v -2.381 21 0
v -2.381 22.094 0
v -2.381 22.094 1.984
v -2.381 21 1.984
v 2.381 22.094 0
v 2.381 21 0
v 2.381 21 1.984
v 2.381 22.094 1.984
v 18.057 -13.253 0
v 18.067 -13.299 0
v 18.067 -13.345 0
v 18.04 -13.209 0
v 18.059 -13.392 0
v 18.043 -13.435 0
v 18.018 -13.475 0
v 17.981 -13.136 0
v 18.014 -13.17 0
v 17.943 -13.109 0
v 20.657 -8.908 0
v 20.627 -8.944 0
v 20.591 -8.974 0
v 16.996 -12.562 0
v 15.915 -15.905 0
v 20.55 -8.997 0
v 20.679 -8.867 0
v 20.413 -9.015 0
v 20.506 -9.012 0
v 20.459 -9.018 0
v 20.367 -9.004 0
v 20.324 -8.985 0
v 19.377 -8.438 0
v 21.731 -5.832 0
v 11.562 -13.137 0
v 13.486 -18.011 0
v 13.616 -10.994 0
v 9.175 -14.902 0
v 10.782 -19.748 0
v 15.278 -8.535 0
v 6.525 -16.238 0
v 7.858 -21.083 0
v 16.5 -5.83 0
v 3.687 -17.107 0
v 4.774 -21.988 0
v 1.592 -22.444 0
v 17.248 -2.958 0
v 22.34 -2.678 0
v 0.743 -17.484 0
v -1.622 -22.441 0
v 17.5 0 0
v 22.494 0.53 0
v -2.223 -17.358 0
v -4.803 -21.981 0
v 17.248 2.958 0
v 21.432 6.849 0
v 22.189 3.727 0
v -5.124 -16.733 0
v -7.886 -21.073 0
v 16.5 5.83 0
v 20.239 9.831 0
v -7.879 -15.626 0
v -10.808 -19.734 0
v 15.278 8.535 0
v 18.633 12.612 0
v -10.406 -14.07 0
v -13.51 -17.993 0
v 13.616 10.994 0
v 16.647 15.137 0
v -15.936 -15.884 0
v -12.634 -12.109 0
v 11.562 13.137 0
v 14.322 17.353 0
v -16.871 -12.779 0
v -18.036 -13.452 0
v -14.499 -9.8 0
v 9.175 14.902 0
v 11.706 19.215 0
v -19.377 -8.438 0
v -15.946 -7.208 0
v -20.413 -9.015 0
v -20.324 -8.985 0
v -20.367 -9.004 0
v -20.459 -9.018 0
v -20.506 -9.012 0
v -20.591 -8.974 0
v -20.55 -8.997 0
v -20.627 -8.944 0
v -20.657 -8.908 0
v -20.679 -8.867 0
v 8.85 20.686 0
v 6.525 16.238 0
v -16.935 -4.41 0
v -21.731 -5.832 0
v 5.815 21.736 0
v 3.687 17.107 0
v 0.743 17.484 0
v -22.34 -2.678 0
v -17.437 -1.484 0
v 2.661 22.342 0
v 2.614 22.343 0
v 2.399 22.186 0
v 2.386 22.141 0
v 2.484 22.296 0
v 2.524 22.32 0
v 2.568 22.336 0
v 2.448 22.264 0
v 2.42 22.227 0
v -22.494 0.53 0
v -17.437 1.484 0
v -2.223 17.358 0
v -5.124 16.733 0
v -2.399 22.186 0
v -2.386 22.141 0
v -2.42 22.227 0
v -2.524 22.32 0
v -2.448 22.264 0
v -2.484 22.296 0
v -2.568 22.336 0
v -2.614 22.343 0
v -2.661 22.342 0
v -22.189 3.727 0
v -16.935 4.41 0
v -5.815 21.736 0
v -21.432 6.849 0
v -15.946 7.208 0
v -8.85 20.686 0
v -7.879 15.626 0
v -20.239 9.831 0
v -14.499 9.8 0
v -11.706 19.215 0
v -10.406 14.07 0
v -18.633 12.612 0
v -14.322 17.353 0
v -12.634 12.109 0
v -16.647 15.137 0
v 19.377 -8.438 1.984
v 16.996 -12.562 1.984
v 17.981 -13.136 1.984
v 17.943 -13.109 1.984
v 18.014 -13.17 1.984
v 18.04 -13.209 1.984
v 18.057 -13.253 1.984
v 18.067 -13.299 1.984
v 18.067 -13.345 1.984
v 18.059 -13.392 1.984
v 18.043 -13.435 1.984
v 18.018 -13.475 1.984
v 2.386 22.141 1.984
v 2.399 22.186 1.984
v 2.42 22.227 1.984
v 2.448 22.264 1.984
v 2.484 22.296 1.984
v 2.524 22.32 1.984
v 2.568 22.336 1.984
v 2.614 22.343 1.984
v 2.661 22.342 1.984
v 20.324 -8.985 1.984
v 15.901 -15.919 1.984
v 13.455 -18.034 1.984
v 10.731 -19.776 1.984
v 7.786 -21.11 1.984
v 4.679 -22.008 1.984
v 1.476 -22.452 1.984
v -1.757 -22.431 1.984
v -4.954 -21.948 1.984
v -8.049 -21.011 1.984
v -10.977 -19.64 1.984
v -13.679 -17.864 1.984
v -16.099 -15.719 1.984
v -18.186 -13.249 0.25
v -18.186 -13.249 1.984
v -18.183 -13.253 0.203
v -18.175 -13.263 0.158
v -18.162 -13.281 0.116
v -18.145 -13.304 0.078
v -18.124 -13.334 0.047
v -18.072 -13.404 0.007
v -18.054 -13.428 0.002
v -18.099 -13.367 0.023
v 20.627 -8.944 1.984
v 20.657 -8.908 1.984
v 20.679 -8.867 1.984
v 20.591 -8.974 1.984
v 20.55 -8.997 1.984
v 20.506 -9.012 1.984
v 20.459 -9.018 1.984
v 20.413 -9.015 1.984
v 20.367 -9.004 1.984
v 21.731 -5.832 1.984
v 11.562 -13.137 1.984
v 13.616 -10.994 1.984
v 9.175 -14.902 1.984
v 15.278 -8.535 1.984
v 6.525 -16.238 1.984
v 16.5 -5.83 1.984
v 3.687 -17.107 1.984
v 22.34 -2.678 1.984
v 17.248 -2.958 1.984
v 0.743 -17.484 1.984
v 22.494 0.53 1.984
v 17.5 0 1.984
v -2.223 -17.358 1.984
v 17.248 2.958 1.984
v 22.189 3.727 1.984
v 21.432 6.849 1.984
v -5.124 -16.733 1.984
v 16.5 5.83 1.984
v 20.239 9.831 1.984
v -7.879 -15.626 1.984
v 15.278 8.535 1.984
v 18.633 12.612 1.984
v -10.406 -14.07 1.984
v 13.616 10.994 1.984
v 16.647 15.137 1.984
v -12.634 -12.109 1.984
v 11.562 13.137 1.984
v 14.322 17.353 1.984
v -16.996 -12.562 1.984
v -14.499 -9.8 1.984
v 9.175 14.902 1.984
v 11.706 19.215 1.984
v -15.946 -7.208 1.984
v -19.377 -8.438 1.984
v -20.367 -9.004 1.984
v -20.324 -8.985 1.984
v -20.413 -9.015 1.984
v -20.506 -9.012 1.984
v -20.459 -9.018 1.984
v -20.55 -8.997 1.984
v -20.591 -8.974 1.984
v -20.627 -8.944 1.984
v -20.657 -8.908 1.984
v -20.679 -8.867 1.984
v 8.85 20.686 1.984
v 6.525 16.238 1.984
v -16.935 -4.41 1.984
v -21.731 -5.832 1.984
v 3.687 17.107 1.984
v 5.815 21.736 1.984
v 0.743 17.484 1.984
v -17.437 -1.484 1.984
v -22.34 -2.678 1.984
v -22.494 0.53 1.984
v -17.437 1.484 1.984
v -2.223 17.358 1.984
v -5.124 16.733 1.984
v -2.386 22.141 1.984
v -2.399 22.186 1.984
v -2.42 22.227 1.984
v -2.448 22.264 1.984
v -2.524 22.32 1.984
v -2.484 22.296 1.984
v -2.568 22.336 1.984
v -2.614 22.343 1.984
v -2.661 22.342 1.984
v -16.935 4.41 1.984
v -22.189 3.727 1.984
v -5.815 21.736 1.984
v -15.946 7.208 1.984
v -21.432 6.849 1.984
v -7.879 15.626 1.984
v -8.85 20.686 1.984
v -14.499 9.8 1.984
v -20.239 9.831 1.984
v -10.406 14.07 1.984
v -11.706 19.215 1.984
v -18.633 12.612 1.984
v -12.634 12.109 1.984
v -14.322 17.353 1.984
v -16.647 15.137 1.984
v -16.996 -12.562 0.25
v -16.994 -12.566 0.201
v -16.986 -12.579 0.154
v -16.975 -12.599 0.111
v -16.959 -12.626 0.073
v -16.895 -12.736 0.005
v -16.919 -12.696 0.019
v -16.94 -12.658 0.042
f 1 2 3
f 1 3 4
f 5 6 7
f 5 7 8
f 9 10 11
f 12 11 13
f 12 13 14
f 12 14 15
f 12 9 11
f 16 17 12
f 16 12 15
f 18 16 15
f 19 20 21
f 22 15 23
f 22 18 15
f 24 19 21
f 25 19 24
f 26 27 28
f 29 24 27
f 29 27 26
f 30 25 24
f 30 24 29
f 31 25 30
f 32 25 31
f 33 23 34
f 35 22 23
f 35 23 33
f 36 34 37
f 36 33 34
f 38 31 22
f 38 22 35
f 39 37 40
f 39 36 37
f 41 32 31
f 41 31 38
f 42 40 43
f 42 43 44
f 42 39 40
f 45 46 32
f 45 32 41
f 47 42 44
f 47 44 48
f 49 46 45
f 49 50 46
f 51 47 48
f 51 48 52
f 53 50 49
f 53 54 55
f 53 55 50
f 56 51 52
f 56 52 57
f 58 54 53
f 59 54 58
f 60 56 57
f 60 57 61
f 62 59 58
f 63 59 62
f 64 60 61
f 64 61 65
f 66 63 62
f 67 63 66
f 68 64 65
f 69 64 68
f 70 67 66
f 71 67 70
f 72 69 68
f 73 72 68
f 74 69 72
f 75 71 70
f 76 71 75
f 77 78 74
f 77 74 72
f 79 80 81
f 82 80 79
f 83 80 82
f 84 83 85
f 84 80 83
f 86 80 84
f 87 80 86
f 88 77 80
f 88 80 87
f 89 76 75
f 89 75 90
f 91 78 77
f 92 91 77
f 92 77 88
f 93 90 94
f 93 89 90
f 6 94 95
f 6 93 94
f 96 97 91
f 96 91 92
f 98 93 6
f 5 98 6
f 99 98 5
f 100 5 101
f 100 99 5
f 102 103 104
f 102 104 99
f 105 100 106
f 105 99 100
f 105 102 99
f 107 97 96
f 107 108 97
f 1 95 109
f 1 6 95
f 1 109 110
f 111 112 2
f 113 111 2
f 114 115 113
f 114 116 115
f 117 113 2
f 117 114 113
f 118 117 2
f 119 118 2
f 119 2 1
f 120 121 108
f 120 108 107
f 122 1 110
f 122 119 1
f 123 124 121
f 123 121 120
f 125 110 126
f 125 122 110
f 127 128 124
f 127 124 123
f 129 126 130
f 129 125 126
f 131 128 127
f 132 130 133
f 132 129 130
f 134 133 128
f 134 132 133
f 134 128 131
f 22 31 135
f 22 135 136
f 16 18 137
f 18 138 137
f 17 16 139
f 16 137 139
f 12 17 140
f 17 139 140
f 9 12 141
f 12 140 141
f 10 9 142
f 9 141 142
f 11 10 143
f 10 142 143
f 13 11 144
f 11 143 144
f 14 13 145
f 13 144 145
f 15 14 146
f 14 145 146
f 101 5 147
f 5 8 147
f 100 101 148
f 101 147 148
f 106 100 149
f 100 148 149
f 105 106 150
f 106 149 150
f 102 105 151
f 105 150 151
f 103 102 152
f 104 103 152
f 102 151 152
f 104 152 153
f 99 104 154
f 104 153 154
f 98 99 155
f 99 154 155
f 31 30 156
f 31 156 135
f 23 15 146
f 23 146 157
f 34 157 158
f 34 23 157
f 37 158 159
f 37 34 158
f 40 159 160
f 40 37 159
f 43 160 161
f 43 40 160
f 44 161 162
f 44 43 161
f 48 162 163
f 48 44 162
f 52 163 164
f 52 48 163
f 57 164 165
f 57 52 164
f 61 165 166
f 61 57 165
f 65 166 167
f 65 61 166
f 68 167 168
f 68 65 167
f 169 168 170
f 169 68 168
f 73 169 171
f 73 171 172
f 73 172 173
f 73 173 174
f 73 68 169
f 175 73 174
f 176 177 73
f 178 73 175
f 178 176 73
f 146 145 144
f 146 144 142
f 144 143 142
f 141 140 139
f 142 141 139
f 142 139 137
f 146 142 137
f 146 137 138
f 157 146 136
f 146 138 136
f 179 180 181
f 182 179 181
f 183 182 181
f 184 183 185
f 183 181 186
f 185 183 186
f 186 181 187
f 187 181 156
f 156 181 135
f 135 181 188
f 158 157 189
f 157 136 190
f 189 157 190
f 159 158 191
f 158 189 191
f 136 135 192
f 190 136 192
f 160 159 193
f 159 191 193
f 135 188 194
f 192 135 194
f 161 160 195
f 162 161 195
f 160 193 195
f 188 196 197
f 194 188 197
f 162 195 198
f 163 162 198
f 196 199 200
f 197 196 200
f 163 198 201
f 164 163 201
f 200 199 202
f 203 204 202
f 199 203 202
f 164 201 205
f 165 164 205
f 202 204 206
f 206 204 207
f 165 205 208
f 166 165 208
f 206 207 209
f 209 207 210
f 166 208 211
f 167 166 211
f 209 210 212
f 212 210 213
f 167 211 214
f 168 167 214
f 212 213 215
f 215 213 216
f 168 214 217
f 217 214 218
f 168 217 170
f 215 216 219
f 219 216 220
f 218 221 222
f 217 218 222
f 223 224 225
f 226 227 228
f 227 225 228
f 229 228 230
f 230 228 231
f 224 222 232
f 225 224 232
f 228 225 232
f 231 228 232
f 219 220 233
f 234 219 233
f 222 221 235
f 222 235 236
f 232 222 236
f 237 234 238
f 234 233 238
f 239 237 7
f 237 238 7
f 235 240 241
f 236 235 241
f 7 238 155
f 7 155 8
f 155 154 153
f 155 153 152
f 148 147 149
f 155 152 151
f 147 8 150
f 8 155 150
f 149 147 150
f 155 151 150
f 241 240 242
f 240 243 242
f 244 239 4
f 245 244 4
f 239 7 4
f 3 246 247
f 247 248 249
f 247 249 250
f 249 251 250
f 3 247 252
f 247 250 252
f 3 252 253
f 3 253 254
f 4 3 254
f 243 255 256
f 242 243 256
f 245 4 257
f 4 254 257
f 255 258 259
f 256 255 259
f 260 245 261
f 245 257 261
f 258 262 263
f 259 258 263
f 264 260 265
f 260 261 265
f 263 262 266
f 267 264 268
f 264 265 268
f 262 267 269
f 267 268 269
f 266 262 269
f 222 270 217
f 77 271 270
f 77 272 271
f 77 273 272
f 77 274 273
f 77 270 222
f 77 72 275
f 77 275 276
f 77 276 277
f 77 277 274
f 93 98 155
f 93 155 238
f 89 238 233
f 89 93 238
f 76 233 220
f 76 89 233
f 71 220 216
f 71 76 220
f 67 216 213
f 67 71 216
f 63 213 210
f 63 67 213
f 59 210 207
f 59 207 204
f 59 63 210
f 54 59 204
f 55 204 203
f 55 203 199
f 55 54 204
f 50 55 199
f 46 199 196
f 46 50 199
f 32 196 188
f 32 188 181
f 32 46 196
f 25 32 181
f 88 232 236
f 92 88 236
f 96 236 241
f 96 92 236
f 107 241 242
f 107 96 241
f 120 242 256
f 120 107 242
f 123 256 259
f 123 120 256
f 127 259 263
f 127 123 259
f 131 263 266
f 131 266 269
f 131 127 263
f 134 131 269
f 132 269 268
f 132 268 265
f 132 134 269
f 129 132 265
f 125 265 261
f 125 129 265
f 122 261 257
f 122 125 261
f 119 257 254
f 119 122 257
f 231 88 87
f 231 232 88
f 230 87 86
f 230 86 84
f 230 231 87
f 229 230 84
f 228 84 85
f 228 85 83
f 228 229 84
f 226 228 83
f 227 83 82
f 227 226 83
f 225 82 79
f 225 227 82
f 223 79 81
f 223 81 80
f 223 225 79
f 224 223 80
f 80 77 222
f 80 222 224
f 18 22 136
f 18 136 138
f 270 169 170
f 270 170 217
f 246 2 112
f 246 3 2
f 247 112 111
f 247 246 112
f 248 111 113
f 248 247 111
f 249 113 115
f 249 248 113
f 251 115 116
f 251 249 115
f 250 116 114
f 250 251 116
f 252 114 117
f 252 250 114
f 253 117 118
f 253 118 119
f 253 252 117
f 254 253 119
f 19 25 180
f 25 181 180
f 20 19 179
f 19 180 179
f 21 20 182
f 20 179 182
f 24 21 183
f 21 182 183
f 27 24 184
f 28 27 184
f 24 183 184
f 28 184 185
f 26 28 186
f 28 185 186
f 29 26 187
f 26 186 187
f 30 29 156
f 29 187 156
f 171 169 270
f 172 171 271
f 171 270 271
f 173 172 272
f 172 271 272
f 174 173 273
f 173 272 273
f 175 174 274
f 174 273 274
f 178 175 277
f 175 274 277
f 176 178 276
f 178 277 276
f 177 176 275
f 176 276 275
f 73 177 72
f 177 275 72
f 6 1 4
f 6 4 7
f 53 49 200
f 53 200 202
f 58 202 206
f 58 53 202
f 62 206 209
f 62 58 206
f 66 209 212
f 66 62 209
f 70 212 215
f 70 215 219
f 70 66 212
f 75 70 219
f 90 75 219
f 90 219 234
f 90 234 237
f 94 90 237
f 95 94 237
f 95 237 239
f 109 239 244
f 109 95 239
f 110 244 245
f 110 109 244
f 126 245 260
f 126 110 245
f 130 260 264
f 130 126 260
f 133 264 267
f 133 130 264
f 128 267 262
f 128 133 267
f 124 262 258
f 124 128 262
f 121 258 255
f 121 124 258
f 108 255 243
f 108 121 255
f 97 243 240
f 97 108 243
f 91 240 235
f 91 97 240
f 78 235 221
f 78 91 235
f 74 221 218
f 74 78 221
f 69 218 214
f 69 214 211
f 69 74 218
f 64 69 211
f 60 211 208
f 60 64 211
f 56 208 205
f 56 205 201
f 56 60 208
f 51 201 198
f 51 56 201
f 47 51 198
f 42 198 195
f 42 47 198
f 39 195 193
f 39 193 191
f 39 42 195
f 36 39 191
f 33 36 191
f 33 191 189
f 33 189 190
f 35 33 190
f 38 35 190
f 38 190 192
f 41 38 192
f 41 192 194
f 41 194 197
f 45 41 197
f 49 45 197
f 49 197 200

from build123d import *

# Parameters (mm, degrees)
SKETCH1_R           = 17.5
BOSS_EXTRUDE1_DEPTH = 1.984375
FILLET1_R           = 0.25


with BuildPart() as part:
    # Sketch1 → Boss-Extrude1 (new body)
    with BuildSketch(Plane.XY):
        with BuildLine():
            Line((0, 21), (2.38125, 21))
            Line((2.38125, 21), (2.38125, 22.373637354))
            ThreePointArc((2.38125, 22.373637354), (19.485571585, 11.25), (20.566763323, -9.124595684))
            Line((20.566763323, -9.124595684), (19.377158479, -8.437777007))
            Line((19.377158479, -8.437777007), (18.186533479, -10.5))
            Line((18.186533479, -10.5), (16.995908479, -12.562222993))
            Line((16.995908479, -12.562222993), (18.185513323, -13.24904167))
            ThreePointArc((18.185513323, -13.24904167), (0, -22.5), (-18.185513323, -13.24904167))
            Line((-18.185513323, -13.24904167), (-16.995908479, -12.562222993))
            Line((-16.995908479, -12.562222993), (-18.186533479, -10.5))
            Line((-18.186533479, -10.5), (-19.377158479, -8.437777007))
            Line((-19.377158479, -8.437777007), (-20.566763323, -9.124595684))
            ThreePointArc((-20.566763323, -9.124595684), (-19.485571585, 11.25), (-2.38125, 22.373637354))
            Line((-2.38125, 22.373637354), (-2.38125, 21))
            Line((-2.38125, 21), (0, 21))
        make_face()
        Circle(SKETCH1_R, mode=Mode.SUBTRACT)
    extrude(amount=BOSS_EXTRUDE1_DEPTH)

    # Fillet1
    fillet1_edges = [part.edges().sort_by_distance(p)[0] for p in [
        (-17.590710901, -12.905632331, 0),
        (2.38125, 22.373637354, 0.9921875),
        (20.566763323, -9.124595684, 0.9921875),
        (18.185513323, -13.24904167, 0.9921875),
        (-20.566763323, -9.124595684, 0.9921875),
        (-2.38125, 22.373637354, 0.9921875),
    ]]
    fillet(fillet1_edges, radius=FILLET1_R)


solid = part.part
